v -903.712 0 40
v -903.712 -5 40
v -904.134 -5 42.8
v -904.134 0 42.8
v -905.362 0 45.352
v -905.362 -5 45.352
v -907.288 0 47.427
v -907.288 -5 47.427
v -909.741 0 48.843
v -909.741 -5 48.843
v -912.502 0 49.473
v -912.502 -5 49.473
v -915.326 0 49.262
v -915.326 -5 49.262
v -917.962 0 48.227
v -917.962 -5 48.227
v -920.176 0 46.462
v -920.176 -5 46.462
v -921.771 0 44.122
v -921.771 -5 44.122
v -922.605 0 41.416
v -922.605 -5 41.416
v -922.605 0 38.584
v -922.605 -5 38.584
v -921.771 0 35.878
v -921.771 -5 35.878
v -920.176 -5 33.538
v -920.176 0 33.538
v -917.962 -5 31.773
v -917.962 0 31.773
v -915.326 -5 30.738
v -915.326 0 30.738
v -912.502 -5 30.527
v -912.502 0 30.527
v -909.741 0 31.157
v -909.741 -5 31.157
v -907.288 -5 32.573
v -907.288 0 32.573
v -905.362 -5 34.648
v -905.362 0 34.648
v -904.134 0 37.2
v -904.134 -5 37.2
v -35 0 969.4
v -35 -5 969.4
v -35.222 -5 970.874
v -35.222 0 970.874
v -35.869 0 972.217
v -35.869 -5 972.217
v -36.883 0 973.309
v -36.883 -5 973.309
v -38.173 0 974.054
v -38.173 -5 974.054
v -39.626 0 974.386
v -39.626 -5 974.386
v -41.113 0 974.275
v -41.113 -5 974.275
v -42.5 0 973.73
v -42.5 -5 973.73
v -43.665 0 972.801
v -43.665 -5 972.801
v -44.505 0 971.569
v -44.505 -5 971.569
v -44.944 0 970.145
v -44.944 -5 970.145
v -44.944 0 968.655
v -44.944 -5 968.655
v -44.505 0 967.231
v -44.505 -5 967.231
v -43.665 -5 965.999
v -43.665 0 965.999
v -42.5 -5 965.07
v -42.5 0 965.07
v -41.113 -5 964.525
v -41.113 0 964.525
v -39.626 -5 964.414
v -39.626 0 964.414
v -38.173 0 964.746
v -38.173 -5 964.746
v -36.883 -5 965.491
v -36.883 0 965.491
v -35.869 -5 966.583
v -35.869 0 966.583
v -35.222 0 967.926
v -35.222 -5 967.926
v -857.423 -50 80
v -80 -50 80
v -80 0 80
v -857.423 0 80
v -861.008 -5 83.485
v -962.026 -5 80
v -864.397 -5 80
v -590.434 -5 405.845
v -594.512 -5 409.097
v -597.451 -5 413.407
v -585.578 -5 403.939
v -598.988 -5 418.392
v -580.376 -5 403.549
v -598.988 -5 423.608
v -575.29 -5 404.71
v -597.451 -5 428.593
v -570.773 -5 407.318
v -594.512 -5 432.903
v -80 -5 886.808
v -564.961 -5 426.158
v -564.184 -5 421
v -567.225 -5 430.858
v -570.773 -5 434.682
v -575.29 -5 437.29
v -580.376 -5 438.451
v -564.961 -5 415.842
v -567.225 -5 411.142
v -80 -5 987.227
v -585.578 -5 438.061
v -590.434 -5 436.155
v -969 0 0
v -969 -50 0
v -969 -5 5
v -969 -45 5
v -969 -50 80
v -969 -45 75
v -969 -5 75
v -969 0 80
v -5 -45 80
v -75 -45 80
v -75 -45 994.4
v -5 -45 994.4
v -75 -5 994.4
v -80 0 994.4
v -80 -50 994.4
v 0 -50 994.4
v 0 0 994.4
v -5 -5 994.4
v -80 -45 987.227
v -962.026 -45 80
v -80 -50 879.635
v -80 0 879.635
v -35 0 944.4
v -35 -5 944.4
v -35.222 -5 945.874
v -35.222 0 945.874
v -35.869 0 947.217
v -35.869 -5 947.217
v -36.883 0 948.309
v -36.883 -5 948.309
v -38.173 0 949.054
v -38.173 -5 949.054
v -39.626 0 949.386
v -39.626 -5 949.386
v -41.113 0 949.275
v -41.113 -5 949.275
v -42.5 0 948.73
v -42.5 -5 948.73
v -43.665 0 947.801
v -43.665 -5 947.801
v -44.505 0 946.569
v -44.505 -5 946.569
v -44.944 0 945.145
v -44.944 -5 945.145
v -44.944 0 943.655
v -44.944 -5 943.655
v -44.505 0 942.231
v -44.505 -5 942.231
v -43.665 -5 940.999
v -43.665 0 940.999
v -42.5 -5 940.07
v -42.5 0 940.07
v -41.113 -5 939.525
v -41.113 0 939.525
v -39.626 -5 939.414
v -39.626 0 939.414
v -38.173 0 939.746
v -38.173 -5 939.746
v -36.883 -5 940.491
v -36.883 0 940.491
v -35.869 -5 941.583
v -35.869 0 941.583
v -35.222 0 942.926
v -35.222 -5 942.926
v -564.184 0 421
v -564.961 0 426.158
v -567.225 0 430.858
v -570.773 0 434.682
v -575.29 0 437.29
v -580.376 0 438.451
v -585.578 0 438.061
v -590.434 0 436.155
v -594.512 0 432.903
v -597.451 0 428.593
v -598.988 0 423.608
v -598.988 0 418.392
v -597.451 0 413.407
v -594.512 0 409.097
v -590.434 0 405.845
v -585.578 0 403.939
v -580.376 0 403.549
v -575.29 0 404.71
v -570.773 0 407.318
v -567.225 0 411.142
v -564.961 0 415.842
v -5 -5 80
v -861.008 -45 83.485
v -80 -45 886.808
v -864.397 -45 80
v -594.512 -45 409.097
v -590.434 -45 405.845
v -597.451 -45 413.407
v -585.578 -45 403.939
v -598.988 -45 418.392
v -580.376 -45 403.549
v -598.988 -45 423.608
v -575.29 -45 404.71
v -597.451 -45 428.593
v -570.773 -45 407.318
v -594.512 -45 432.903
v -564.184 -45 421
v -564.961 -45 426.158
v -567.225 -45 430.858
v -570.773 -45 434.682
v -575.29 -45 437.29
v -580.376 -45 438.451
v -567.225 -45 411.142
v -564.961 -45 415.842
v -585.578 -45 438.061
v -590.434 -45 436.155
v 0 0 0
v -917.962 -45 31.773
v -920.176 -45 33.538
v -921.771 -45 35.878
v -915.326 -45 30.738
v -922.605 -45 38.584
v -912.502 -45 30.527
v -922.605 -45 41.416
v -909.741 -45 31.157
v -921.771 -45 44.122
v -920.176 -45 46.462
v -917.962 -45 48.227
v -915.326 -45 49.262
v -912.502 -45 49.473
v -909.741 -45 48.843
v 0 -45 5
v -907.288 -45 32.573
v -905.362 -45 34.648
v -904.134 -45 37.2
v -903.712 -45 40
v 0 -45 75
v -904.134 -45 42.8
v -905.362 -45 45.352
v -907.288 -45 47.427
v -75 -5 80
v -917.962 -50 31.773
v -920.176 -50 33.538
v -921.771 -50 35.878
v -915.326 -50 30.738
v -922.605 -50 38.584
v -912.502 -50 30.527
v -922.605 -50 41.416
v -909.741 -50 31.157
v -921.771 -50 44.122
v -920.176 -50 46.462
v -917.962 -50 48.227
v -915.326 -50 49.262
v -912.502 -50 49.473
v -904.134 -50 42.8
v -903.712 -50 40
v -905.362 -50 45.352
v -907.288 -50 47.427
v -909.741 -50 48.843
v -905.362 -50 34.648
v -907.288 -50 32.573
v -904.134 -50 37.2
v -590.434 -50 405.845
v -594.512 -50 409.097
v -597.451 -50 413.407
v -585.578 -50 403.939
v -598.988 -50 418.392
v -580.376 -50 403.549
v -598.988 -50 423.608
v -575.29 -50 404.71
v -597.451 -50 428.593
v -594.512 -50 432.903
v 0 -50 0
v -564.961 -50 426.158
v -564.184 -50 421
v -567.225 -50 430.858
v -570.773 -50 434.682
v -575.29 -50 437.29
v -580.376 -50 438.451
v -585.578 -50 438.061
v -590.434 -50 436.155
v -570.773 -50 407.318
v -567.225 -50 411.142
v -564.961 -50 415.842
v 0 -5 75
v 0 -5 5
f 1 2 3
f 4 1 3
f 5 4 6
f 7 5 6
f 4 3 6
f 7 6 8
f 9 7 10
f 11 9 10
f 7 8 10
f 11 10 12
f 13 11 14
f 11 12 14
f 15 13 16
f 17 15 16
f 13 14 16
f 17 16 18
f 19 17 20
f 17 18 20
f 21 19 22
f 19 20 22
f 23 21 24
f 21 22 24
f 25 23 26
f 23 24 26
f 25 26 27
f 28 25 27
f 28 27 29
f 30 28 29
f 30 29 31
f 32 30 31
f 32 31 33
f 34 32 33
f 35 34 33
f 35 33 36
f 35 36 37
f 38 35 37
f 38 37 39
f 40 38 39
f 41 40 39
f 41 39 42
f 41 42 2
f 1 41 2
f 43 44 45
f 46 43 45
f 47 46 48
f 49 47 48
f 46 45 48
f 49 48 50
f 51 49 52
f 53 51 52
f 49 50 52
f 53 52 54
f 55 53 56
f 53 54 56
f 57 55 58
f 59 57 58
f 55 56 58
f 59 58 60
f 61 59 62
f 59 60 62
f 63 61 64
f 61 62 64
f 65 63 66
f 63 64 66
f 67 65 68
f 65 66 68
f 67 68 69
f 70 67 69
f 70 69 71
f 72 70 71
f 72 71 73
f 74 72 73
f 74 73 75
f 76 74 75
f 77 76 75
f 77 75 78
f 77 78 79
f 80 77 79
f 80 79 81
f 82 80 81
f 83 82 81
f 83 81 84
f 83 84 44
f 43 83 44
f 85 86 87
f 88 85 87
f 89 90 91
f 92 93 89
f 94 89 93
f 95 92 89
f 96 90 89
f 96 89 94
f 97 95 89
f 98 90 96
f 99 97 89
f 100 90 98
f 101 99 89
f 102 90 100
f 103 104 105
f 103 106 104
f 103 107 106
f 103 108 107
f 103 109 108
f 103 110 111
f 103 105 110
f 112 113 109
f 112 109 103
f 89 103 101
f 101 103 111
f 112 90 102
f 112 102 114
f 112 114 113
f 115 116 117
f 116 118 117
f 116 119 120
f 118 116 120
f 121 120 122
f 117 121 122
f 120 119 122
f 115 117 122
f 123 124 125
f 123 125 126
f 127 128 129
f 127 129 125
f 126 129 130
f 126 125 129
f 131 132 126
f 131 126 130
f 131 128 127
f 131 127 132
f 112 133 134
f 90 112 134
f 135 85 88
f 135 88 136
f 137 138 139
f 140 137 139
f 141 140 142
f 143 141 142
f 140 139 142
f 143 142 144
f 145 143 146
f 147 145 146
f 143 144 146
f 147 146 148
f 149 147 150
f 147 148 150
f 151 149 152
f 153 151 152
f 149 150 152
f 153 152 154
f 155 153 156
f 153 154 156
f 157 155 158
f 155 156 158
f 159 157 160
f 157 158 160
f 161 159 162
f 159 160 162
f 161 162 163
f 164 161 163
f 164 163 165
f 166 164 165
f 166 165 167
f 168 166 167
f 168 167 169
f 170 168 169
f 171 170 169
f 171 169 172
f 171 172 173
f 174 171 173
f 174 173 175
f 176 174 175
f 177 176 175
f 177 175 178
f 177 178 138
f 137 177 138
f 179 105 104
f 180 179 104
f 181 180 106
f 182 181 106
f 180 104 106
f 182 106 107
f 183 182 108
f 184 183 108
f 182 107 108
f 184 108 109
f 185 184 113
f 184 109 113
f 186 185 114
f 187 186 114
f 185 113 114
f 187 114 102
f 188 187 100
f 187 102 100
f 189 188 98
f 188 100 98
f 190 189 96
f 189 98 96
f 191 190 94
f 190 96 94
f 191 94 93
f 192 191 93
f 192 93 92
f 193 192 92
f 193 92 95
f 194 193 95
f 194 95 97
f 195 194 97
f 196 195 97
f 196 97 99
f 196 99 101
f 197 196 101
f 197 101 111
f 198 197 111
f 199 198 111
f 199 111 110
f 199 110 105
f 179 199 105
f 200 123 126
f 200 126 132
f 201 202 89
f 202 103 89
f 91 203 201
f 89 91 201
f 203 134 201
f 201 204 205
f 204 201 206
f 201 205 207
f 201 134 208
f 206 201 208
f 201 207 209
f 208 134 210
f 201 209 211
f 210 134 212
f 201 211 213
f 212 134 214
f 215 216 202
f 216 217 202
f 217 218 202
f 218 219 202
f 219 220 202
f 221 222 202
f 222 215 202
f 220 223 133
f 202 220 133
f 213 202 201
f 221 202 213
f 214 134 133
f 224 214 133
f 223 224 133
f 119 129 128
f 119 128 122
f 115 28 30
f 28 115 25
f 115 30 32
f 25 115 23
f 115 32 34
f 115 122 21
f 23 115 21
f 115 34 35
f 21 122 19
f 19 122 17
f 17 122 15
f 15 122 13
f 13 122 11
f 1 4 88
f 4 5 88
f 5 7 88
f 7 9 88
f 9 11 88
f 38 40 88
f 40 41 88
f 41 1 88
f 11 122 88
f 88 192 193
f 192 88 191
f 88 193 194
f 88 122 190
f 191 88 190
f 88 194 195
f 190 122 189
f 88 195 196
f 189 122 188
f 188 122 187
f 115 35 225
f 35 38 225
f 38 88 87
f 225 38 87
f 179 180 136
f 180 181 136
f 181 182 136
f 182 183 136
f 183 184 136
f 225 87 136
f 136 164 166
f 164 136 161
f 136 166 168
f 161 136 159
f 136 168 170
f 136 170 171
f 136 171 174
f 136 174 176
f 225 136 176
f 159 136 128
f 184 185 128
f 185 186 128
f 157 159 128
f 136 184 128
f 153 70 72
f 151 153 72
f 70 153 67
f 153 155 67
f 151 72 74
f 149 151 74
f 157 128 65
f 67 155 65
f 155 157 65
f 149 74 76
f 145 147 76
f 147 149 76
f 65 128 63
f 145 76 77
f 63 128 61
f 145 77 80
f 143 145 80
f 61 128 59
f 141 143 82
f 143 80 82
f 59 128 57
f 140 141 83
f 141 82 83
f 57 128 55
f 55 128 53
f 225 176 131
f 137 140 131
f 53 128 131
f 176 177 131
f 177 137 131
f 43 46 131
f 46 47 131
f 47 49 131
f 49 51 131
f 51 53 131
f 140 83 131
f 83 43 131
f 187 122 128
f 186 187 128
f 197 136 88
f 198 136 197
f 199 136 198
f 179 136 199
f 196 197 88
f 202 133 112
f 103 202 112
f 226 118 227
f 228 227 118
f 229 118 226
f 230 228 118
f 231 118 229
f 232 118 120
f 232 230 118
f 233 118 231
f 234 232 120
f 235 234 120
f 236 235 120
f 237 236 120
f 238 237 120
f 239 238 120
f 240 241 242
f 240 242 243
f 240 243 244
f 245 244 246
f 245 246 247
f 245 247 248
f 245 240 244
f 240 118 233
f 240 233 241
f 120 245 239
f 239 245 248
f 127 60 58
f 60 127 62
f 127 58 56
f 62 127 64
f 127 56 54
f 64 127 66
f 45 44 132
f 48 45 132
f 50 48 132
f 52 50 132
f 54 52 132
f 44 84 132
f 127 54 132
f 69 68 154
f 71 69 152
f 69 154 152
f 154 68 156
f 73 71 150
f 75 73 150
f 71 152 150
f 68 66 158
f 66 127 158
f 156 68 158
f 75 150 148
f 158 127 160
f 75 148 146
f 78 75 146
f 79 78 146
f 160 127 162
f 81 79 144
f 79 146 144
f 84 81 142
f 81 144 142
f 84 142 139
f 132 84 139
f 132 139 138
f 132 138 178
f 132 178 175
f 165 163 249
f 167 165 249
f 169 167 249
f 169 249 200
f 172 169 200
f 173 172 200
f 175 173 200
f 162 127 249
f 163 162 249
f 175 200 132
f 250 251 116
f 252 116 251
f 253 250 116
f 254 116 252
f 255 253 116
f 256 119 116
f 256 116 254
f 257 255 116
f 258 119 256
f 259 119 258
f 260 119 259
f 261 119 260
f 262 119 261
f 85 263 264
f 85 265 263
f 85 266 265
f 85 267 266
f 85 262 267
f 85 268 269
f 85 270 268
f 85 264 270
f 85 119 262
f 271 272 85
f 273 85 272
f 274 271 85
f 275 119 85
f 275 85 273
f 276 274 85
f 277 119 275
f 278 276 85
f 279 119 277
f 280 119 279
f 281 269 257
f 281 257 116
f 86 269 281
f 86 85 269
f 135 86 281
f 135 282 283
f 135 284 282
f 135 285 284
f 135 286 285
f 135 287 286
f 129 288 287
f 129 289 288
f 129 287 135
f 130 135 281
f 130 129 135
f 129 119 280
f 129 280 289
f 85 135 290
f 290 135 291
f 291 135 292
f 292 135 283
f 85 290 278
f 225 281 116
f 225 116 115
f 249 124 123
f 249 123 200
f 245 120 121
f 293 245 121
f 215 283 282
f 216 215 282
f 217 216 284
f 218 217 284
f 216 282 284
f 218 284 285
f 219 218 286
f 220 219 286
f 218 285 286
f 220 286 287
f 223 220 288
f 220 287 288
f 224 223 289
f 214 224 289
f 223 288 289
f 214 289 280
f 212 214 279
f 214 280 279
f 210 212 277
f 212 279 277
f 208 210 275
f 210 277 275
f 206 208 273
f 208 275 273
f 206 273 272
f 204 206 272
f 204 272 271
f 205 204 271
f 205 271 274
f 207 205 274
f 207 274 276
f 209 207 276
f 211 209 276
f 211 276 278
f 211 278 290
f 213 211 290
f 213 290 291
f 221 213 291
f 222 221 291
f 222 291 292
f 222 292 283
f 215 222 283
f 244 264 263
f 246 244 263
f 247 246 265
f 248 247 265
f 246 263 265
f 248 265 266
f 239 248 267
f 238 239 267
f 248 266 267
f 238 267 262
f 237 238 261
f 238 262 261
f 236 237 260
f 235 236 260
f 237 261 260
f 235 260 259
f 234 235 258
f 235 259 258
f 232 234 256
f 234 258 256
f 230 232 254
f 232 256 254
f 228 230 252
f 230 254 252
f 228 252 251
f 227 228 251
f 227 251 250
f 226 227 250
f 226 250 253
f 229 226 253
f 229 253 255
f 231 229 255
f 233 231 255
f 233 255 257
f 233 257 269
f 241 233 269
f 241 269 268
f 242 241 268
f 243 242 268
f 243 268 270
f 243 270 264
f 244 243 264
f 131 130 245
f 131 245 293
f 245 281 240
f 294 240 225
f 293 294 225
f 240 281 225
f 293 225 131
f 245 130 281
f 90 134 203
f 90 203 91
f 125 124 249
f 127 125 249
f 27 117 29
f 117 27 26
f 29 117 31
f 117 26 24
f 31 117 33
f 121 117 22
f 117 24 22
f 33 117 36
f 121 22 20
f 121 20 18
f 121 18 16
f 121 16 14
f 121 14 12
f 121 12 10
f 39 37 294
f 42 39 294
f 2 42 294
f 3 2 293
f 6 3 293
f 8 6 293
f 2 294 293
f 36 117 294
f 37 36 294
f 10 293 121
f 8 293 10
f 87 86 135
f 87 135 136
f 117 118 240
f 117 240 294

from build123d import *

# Parameters (mm, degrees)
F0_W         = 50
F0_H         = 80
F0_W_2       = 40
F0_H_2       = 70
F1_DEPTH     = 969
F2_W         = 80
F2_H         = 50
F2_W_2       = 70
F2_H_2       = 40
F3_DEPTH     = 914.4
F5_DEPTH     = 50
F6_R         = 17.5
F6_R_2       = 9.5
F7_DEPTH     = 50.001
F8_T         = 5
F8_T3_DEPTH  = 60
F8_T5_DEPTH  = 979
F8_T7_DEPTH  = 924.4
F8_T9_DEPTH  = 80
F8_T11_DEPTH = 50
F9_START     = -25.4
F6_R_3       = 5
F9_DEPTH     = 27.432


# Not quite as in the source:
# - a shell that OpenCascade refuses in one call is made with other operations: the cavity is built on its own and cut out


with BuildPart() as f1:
    # F0 (on Right) → F1 (new body)
    with BuildSketch(Plane.YZ):
        with Locations((-25, 40)):
            Rectangle(F0_W, F0_H)
        with Locations((-25, 40)):
            Rectangle(F0_W_2, F0_H_2, mode=Mode.SUBTRACT)
    extrude(amount=-F1_DEPTH)

    # F2 (on face) → F3 (join)
    with BuildSketch(Plane.XY.offset(80)):
        with Locations((-40, -25)):
            Rectangle(F2_W, F2_H)
        with Locations((-40, -25)):
            Rectangle(F2_W_2, F2_H_2, mode=Mode.SUBTRACT)
    extrude(amount=F3_DEPTH)

    # F4 (on face) → F5 (join)
    with BuildSketch(Plane.XZ.offset(50)):
        Polygon((-80, 994.4), (-969, 80), (-857.4231981277, 80), (-80, 879.6352895028), align=None)
    extrude(amount=-F5_DEPTH)

    # F6 (on face) → F7 (cut, through all)
    with BuildSketch(Plane.XZ.offset(50)):
        with Locations((-581.6838212861, 421)):
            Circle(F6_R)
        with Locations((-913.2115990639, 40)):
            Circle(F6_R_2)
    extrude(amount=-F7_DEPTH, mode=Mode.SUBTRACT)

    # F8: shell of thickness 5, made by hand


with BuildPart() as f8_core1:
    # F8_t2: copy of F1
    add(f1.part)

    # the walls: a layer under each face that stays
    f8_faces = [f8_core1.faces().sort_by_distance(p)[0] for p in [
        (-484.5, -25, 0),
        (-484.5, -50, 497.2),
        (-484.5, 0, 497.2),
        (0, -25, 497.2),
        (-969, -46.4285714286, 5.7142857143),
        (-524.5, -25, 537.2),
        (-74.2857142857, -46.4285714286, 994.4),
        (-922.7115990639, -47.5, 40),
        (-468.7115990639, -25, 80),
        (-80, -25, 479.8176447514),
        (-468.7115990639, -25, 479.8176447514),
        (-922.7115990639, -2.5, 40),
        (-484.5, -25, 75),
        (-484.5, -5, 40),
        (-484.5, -25, 5),
        (-484.5, -45, 40),
        (-40, -5, 537.2),
        (-5, -25, 537.2),
        (-40, -45, 537.2),
        (-75, -25, 537.2),
        (-40, -25, 80),
    ]]
    thicken(f8_faces, amount=-F8_T, mode=Mode.SUBTRACT)

    # F8_s4 → F8_t3 (cut)
    with BuildSketch(Plane.XZ.offset(-5)):
        Polygon((-80.05, 80.05), (-80, 75), (-75, 75), (-75, 80), align=None)
        Polygon((-857.3873483818, 80.0151460803), (-857.4231981277, 75), (-869.2578593558, 75), (-861.0081727218, 83.4853919665), align=None)
        Polygon((-80.0141502541, 879.6004355831), (-75, 879.6352895028), (-75, 891.9509410517), (-83.5849745941, 883.1206814692), align=None)
    extrude(amount=F8_T3_DEPTH, mode=Mode.SUBTRACT)

    # F8_s6 → F8_t5 (cut)
    with BuildSketch(Plane.YZ.offset(-974)):
        Polygon((-44.95, 74.95), (-45, 80), (-50, 80), (-50, 75), align=None)
        Polygon((-5.05, 74.95), (-5, 80), (0, 80), (0, 75), align=None)
        Polygon((-5.05, 5.05), (0, 5), (0, 0), (-5, 0), align=None)
        Polygon((-44.95, 5.05), (-45, 0), (-50, 0), (-50, 5), align=None)
    extrude(amount=F8_T5_DEPTH, mode=Mode.SUBTRACT)

    # F8_s8 → F8_t7 (cut)
    with BuildSketch(Plane.XY.offset(75)):
        Polygon((-74.95, -5.05), (-75, 0), (-80, 0), (-80, -5), align=None)
        Polygon((-5.05, -5.05), (-5, 0), (0, 0), (0, -5), align=None)
        Polygon((-5.05, -44.95), (0, -45), (0, -50), (-5, -50), align=None)
        Polygon((-74.95, -44.95), (-75, -50), (-80, -50), (-80, -45), align=None)
    extrude(amount=F8_T7_DEPTH, mode=Mode.SUBTRACT)

    # F8_s10 → F8_t9 (cut)
    with BuildSketch(Plane.YZ.offset(-80)):
        Polygon((-5.05, 80.05), (0, 80), (0, 75), (-5, 75), align=None)
        Polygon((-44.95, 80.05), (-50, 80), (-50, 75), (-45, 75), align=None)
    extrude(amount=F8_T9_DEPTH, mode=Mode.SUBTRACT)

    # F8_s12 → F8_t11 (cut)
    with BuildSketch(Plane.XZ):
        Polygon((-5.05, 80.05), (0, 80), (0, 75), (-5, 75), align=None)
        Polygon((-74.95, 80.05), (-80, 80), (-80, 75), (-75, 75), align=None)
    extrude(amount=F8_T11_DEPTH, mode=Mode.SUBTRACT)


with BuildPart() as f1_1:
    add(f1.part)

    # what is left inside the walls is the cavity
    f8_cavity = [f8_core1.part.solids().sort_by_distance(p)[0] for p in [
        (-635.349987, -5.05, 363.508502),
    ]]
    add(f8_cavity, mode=Mode.SUBTRACT)

    # F6 (on face) → F9 (cut)
    with BuildSketch(Plane.XZ.offset(50).offset(F9_START)):
        with Locations((-40, 969.4)):
            Circle(F6_R_3)
        with Locations((-40, 944.4)):
            Circle(F6_R_3)
    extrude(amount=-F9_DEPTH, mode=Mode.SUBTRACT)


solid = f1_1.part
